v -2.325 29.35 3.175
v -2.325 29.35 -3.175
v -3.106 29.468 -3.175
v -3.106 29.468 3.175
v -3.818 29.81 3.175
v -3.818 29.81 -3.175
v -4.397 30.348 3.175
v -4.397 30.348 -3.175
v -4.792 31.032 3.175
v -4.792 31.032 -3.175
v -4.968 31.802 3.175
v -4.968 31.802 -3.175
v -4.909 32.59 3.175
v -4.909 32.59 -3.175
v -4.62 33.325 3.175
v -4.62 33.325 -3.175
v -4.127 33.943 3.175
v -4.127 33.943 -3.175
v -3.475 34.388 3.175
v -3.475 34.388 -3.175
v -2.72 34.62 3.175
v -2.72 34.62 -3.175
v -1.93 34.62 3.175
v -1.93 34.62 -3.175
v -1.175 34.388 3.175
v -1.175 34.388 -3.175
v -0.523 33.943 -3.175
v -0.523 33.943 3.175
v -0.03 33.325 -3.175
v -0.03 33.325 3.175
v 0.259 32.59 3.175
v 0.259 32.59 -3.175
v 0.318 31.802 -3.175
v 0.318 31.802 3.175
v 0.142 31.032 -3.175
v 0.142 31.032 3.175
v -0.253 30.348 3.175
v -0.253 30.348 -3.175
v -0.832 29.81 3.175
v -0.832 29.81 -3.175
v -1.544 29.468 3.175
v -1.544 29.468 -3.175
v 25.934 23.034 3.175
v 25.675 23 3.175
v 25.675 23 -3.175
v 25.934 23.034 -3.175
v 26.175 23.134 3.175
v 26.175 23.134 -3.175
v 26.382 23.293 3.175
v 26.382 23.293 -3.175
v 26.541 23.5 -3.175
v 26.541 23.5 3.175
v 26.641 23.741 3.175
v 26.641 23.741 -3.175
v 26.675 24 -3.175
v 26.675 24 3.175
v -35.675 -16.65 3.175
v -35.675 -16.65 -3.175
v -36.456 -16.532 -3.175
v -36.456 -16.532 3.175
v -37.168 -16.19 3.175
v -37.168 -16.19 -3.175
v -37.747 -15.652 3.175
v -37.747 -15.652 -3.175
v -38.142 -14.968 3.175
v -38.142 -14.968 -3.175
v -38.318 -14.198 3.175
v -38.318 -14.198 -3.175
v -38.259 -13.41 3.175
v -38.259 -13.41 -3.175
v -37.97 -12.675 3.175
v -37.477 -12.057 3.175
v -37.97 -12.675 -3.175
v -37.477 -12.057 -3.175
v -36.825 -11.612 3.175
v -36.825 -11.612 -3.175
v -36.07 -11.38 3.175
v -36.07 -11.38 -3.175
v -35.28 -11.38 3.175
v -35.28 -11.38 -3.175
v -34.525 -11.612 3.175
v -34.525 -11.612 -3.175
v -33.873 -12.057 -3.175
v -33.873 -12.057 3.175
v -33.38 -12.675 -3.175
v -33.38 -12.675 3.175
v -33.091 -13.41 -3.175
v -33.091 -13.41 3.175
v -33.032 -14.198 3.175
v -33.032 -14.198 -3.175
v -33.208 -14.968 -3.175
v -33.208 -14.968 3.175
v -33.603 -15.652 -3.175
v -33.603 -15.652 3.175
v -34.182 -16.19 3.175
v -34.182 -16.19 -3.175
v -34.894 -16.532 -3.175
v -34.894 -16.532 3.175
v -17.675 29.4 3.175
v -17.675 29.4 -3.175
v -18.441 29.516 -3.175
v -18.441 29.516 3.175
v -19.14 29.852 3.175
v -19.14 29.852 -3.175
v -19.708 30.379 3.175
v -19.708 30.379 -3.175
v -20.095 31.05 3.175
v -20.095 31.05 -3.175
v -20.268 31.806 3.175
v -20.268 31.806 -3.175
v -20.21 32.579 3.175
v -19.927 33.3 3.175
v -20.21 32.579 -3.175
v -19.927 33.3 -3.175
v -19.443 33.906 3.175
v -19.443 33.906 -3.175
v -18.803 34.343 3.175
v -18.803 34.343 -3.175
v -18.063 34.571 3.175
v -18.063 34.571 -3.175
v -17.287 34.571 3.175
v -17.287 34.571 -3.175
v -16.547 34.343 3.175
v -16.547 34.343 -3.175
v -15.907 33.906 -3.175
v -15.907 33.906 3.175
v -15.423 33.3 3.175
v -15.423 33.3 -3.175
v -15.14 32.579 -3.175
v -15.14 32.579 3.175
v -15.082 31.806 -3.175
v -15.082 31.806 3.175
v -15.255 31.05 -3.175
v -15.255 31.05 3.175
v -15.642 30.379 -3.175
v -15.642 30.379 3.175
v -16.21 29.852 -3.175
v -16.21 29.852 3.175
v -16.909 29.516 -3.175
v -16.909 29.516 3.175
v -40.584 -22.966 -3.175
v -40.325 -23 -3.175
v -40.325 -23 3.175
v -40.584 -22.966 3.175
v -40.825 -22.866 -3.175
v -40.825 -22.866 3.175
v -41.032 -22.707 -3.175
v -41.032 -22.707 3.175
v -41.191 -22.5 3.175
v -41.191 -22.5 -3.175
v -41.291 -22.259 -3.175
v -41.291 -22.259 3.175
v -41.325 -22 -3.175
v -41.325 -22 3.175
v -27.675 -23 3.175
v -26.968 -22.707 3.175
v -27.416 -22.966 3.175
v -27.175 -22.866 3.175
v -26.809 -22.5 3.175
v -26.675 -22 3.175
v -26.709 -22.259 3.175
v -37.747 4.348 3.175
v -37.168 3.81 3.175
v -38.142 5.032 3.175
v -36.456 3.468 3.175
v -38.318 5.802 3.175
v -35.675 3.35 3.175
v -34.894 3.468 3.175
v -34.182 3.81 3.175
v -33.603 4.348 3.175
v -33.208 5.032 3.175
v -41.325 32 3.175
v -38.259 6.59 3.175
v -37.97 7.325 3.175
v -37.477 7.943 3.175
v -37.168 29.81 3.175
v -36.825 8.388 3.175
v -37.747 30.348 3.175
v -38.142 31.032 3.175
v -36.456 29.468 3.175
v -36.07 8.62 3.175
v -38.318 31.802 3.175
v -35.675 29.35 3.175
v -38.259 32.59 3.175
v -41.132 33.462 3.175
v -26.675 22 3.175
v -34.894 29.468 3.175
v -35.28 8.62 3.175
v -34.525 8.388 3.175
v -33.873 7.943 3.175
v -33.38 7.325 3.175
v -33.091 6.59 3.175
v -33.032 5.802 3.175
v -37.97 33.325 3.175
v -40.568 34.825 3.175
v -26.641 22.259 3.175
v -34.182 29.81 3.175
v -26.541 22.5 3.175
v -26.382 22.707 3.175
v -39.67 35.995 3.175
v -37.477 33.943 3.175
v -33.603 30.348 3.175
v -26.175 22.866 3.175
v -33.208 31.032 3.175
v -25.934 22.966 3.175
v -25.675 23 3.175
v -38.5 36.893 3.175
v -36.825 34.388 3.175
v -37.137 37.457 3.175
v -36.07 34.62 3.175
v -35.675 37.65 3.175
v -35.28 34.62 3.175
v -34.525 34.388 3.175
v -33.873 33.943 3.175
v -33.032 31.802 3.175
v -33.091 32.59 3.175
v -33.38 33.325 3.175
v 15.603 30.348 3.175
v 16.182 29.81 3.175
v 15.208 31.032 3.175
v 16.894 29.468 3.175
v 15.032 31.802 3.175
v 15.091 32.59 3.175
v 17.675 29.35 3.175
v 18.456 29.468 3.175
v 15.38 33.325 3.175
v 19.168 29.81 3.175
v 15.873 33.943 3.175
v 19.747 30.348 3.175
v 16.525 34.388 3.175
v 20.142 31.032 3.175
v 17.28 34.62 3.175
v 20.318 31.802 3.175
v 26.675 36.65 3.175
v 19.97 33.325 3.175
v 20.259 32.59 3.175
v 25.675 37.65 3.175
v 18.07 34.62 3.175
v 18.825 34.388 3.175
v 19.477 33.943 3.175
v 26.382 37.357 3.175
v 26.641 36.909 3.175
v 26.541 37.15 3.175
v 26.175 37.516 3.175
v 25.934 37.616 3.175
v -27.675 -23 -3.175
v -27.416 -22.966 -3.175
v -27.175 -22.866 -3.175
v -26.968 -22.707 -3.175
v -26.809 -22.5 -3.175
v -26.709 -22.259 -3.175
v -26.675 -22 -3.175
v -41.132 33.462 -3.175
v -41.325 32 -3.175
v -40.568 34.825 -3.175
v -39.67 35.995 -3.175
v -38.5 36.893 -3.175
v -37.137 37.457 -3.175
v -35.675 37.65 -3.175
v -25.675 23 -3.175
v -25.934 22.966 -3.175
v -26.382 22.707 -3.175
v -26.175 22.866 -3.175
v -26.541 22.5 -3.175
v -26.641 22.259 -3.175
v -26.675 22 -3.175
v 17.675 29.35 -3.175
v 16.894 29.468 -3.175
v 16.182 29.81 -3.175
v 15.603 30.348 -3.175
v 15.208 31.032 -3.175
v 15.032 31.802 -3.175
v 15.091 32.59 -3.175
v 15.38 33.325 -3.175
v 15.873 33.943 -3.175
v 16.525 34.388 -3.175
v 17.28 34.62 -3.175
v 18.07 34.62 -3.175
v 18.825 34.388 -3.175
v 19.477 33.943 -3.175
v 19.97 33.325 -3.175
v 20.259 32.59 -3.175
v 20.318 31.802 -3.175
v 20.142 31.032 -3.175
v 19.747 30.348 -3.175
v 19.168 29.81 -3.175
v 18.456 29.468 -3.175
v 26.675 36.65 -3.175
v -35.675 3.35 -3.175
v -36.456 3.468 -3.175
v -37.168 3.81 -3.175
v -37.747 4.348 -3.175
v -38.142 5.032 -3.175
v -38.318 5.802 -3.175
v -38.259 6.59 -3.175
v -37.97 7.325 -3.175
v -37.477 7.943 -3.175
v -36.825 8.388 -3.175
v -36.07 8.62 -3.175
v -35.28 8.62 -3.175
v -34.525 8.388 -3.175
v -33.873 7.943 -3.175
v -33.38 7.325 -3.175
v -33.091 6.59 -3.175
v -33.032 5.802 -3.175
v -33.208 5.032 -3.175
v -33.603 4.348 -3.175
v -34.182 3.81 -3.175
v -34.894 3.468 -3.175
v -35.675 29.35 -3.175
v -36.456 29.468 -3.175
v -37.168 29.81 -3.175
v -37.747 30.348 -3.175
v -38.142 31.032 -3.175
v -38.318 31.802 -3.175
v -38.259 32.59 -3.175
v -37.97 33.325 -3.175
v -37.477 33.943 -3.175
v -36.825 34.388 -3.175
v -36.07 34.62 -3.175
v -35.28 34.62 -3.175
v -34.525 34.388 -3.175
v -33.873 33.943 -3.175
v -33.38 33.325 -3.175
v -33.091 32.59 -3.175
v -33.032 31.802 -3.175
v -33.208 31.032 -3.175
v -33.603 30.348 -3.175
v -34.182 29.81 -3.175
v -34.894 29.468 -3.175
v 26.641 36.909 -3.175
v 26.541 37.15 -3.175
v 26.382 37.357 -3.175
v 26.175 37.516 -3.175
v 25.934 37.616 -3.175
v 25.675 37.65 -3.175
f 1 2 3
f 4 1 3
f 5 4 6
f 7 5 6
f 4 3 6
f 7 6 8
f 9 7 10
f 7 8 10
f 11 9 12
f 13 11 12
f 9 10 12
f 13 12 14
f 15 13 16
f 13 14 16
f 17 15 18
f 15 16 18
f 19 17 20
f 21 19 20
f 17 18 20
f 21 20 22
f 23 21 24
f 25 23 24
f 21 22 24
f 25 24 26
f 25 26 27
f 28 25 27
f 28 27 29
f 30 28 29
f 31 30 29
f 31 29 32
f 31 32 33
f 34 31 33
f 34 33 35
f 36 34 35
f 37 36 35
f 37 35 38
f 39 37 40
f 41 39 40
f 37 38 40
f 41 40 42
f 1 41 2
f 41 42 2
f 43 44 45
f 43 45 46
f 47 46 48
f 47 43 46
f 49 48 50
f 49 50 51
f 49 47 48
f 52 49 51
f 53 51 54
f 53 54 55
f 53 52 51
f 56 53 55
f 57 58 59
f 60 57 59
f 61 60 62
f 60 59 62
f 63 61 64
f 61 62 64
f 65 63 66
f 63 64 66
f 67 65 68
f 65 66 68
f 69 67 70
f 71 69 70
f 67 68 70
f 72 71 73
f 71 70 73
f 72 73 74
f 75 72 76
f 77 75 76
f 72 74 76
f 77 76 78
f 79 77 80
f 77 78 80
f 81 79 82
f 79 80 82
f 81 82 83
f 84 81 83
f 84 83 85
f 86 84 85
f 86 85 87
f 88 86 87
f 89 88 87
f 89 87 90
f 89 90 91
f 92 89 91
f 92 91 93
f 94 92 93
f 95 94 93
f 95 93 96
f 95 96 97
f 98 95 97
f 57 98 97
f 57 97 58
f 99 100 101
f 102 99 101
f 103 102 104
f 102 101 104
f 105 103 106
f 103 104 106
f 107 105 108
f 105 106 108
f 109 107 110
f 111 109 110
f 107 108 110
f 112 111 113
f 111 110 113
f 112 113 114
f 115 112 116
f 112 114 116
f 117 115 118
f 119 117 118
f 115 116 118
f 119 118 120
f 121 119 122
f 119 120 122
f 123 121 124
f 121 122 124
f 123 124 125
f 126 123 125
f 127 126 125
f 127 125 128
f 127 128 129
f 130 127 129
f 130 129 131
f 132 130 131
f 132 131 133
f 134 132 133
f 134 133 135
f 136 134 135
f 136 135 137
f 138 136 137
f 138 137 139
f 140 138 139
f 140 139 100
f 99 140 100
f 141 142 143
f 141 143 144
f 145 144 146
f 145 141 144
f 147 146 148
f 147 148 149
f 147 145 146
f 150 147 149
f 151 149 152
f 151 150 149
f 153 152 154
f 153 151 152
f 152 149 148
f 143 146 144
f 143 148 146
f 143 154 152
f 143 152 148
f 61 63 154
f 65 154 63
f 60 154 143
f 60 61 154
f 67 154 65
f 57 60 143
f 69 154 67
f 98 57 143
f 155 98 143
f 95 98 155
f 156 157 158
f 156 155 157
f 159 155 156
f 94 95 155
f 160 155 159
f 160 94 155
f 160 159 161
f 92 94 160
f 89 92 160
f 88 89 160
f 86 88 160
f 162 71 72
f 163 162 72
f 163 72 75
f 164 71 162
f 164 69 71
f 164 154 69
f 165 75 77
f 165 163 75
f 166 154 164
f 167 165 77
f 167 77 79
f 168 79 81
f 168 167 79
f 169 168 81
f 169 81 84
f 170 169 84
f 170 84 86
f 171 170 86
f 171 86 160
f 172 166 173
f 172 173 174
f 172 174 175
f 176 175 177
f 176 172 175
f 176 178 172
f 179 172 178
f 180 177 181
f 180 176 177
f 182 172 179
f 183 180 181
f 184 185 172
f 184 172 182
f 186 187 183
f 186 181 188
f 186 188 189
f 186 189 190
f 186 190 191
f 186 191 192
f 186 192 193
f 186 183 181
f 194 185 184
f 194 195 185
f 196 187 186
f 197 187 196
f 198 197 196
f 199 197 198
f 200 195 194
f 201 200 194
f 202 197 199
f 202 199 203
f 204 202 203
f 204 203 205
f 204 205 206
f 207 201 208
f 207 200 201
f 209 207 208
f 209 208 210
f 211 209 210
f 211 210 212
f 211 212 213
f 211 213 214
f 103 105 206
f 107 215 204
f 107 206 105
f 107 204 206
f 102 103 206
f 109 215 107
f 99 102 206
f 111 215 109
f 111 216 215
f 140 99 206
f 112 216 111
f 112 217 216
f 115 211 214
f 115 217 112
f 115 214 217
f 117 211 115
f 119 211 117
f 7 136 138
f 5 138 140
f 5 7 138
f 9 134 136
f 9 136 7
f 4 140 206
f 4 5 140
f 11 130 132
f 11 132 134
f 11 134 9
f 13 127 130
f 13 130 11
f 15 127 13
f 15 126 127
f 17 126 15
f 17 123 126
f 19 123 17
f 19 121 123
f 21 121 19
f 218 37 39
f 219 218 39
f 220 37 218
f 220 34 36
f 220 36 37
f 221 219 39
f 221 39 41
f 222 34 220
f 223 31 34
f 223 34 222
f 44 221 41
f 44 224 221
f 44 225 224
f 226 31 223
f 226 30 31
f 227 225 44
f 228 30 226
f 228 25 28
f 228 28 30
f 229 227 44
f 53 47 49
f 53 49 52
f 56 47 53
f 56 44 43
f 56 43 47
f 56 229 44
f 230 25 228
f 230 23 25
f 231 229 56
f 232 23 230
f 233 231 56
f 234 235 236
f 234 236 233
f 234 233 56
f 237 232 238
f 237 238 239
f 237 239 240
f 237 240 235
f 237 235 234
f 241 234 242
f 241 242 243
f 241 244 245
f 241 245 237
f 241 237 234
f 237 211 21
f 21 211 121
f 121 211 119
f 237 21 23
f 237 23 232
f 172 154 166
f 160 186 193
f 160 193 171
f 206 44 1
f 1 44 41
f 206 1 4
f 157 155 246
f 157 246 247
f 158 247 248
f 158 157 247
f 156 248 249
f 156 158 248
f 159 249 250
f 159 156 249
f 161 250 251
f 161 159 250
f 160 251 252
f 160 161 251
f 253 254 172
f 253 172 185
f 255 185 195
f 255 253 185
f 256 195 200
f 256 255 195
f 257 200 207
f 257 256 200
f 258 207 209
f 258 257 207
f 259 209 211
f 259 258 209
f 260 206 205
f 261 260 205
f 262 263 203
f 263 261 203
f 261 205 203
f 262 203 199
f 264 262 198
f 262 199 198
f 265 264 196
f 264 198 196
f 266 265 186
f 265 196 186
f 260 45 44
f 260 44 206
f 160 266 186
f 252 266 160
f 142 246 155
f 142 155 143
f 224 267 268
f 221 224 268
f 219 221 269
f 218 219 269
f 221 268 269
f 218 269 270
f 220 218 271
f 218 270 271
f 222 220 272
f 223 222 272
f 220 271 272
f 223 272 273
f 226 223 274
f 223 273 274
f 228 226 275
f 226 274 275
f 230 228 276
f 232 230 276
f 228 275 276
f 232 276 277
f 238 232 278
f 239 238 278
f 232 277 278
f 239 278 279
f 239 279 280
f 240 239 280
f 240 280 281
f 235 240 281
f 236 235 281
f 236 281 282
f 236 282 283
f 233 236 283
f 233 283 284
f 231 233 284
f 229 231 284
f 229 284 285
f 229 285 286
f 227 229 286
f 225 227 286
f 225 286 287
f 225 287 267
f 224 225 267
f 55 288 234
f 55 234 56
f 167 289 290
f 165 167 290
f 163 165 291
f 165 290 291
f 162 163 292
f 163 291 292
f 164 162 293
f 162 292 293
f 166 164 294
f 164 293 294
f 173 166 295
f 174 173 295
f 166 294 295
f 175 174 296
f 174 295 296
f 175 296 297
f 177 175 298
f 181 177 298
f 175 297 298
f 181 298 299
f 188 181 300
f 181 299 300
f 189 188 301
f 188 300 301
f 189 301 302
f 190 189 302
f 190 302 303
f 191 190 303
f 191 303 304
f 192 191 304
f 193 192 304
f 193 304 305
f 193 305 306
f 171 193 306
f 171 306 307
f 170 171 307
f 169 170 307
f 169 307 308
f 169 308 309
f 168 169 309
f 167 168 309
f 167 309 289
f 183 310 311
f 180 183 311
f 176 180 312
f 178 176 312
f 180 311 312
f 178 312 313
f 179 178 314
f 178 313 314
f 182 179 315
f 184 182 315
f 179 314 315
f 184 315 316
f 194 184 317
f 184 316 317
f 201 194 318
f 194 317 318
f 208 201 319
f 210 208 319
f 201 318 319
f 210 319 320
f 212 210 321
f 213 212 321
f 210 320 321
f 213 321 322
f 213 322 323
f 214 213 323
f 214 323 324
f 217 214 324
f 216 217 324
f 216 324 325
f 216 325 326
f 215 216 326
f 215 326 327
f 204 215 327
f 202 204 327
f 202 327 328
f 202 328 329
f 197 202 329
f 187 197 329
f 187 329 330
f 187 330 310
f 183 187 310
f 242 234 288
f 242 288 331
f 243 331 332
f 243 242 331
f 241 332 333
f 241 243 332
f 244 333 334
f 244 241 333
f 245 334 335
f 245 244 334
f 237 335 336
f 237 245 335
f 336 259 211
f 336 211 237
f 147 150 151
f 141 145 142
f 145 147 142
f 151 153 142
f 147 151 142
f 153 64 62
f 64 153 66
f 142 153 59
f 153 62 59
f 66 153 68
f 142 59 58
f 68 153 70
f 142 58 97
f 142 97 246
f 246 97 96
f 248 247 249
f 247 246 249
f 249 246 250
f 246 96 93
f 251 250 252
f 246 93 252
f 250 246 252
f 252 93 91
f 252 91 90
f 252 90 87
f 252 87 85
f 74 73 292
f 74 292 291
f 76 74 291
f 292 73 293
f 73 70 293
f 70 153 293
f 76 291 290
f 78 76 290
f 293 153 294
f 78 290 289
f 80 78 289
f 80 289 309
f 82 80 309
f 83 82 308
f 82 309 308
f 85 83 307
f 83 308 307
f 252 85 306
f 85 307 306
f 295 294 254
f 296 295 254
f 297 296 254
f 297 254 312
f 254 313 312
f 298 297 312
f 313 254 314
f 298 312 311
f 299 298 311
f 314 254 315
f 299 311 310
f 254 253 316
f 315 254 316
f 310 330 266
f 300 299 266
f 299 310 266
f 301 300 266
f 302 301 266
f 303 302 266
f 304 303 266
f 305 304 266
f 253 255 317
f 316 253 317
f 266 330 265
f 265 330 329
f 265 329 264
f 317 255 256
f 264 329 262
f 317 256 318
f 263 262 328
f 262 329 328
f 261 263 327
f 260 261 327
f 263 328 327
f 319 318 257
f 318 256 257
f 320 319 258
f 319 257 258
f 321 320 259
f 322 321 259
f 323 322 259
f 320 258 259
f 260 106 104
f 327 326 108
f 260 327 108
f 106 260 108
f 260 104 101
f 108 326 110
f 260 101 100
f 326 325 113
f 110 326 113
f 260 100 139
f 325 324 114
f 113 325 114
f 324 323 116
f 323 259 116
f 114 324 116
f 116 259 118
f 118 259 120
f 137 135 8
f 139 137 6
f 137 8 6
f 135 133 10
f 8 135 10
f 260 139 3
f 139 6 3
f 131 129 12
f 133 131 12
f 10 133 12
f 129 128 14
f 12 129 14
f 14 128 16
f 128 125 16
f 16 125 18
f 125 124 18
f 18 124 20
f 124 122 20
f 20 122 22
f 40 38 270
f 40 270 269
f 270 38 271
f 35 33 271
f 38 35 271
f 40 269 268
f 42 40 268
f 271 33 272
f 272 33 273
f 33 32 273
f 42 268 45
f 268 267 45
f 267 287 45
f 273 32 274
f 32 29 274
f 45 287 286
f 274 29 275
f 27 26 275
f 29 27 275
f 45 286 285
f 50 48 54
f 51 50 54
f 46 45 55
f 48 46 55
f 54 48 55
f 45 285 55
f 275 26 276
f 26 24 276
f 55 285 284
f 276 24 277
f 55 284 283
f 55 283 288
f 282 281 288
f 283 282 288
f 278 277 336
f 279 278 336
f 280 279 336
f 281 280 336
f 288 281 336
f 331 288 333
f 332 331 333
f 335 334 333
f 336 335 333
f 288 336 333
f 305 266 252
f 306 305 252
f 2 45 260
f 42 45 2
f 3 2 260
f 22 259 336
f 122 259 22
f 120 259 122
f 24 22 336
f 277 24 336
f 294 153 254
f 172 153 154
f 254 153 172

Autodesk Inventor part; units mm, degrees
ref_plane "YZ Plane" through (0, 0, 0) normal (1, 0, 0) x (0, 1, 0)
ref_plane "XZ Plane" through (0, 0, 0) normal (0, 1, 0) x (-1, 0, 0)
ref_plane "XY Plane" through (0, 0, 0) normal (0, 0, 1) x (1, 0, 0)
sketch "Sketch1" plane through (0, 0, 0) normal (0, 0, 1) x (1, 0, 0)
  line L0 (26.675, -23) -> (-26.675, -23) construction
  line L1 (-26.675, -23) -> (-26.675, 23) construction
  line L2 (-26.675, 23) -> (26.675, 23) construction
  line L3 (26.675, 23) -> (26.675, -23) construction
  line L4 (26.675, -23) -> (-26.675, 23) construction
  line L5 (-26.675, -23) -> (26.675, 23) construction
  line L6 (-26.675, -23) -> (-41.325, -23)
  line L7 (-41.325, -23) -> (-41.325, 15)
  line L8 (-41.325, 15) -> (-26.675, 15)
  line L9 (-26.675, 15) -> (-26.675, -23)
  line L10 (26.675, 23) -> (-11.325, 23)
  line L11 (-11.325, 23) -> (-11.325, 37.65)
  line L12 (-11.325, 37.65) -> (26.675, 37.65)
  line L13 (26.675, 37.65) -> (26.675, 23)
  line L14 (-35.675, -23) -> (-35.675, 32) construction
  line L15 (-35.675, 32) -> (26.675, 32) construction
  circle A0 centre (-35.675, 32) radius 5.65 construction
  line L16 (-26.675, 15) -> (-41.325, 15)
  line L17 (-41.325, 15) -> (-41.325, 37.65)
  line L18 (-35.675, 37.65) -> (-26.675, 37.65)
  line L19 (-26.675, 37.65) -> (-26.675, 15)
  line L20 (-11.325, 23) -> (-41.325, 23)
  line L21 (-41.325, 23) -> (-41.325, 32)
  line L22 (-41.325, 37.65) -> (-11.325, 37.65)
  line L23 (-11.325, 37.65) -> (-11.325, 23)
  arc A1 (-35.675, 37.65) -> (-41.325, 32) centre (-35.675, 32) ccw
  point P0 (0, 0)
  point P1 (0, 0)
  point P2 (-26.675, 23)
  point P3 (-41.325, 32)
  point P4 (-35.675, -14)
  point P5 (-35.675, 6)
  point P6 (17.675, 32)
  point P7 (-2.325, 32)
  dimension "d3" = 9
  dimension "d4" = 9
  dimension "d5" = 5.65
  dimension "d6" = 5.65
  dimension "d8" = 8
  dimension "d9" = 15.35
  dimension "d13" = 5.65
  dimension "d14" = 9
  dimension "d15" = 20
  dimension "d16" = 5.65
  dimension "d17" = 9
  dimension "d18" = 20
  dimension "d33" = 9
  dimension "d35" = 9
extrude "Extrusion1" add sketch "Sketch1" along normal mid plane 6.35 contours L6 L7 L8 L9 | L8 L17 L20 L19 | L20 L17 A1 L18 L19 | L19 L22 L11 L20 | L11 L12 L13 L10
sketch "Sketch2" plane through (0, 0, 3.175) normal (0, 0, 1) x (1, 0, 0)
  line L0 (-41.325, -23) -> (-26.675, -23) projected
  line L1 (-26.675, -23) -> (-26.675, 23) projected
  line L2 (-26.675, 23) -> (26.675, 23) projected
  line L3 (26.675, 23) -> (26.675, 37.65) projected
  line L4 (26.675, 37.65) -> (-35.675, 37.65) projected
  arc A0 (-35.675, 37.65) -> (-41.325, 32) centre (-35.675, 32) ccw construction
  line L5 (-41.325, 32) -> (-41.325, -23) projected
  line L6 (-25.675, 22) -> (-45.675, 22) construction
  line L7 (-45.675, 22) -> (-45.675, 42) construction
  line L8 (-45.675, 42) -> (-25.675, 42) construction
  line L9 (-25.675, 42) -> (-25.675, 22) construction
  line L10 (-25.675, 22) -> (-45.675, 42) construction
  line L11 (-45.675, 22) -> (-25.675, 42) construction
  point P0 (0, 0)
  dimension "d31" = 20
  dimension "d32" = 20
hole "Hole1" at (-35.675, 6, 0) at (-35.675, -14, 0) at (-2.325, 32, 0) at (17.675, 32, 0) at (-35.675, 32, 0) direction (0, 0, -1) diameter 5.3 end through all both
fillet "Fillet1" radius 1 1 edges at (-26.675, 23, 0)
fillet "Fillet2" radius 1 4 edges at (26.675, 23, 0) (26.675, 37.65, 0) (-26.675, -23, 0) (-41.325, -23, 0)
ref_plane "Work Plane1" through (-2.325, 32, 0) normal (0, 1, 0) x (0, 0, 1)
ref_plane "Work Plane2" through (-35.675, 6, 0) normal (1, 0, 0) x (0, 0, 1)
sketch "Sketch3" plane through (0, 0, 3.175) normal (0, 0, 1) x (1, 0, 0)
  arc A0 (-41.325, -22) -> (-40.325, -23) centre (-40.325, -22) ccw projected
  line L0 (-40.325, -23) -> (-27.675, -23) projected
  arc A1 (-27.675, -23) -> (-26.675, -22) centre (-27.675, -22) ccw projected
  line L1 (-26.675, -22) -> (-26.675, 22) projected
  arc A2 (-25.675, 23) -> (-26.675, 22) centre (-25.675, 22) ccw projected
  line L2 (-25.675, 23) -> (25.675, 23) projected
  arc A3 (25.675, 23) -> (26.675, 24) centre (25.675, 24) ccw projected
  line L3 (26.675, 24) -> (26.675, 36.65) projected
  arc A4 (26.675, 36.65) -> (25.675, 37.65) centre (25.675, 36.65) ccw projected
  line L4 (25.675, 37.65) -> (-35.675, 37.65) projected
  arc A5 (-35.675, 37.65) -> (-41.325, 32) centre (-35.675, 32) ccw projected
  line L5 (-41.325, 32) -> (-41.325, -22) projected
  circle A6 centre (-35.675, 32) radius 2.65 projected
  circle A7 centre (17.675, 32) radius 2.65 projected
  circle A8 centre (-2.325, 32) radius 2.65 projected
  circle A9 centre (-35.675, -14) radius 2.65 projected
  circle A10 centre (-35.675, 6) radius 2.65 projected
  point P0 (0, 0)
  point P1 (-17.675, 32)
  point P2 (-35.675, 20.5)
  dimension "d36" = 11.5
  dimension "d37" = 18
hole "Hole2" at (-17.675, 32, 3.175) direction (0, 0, -1) diameter 5.2 end through all
equation "\"d4\" = d3"
equation "\"d6\" = d5"
equation "\"d14\" = d33"
equation "\"d17\" = d35"
equation "\"d18\" = d15"
equation "\"d33\" = d3"
equation "\"d35\" = d4"
properties part number "Top Corner Extrusion Plate" material "Aluminum 6061"
